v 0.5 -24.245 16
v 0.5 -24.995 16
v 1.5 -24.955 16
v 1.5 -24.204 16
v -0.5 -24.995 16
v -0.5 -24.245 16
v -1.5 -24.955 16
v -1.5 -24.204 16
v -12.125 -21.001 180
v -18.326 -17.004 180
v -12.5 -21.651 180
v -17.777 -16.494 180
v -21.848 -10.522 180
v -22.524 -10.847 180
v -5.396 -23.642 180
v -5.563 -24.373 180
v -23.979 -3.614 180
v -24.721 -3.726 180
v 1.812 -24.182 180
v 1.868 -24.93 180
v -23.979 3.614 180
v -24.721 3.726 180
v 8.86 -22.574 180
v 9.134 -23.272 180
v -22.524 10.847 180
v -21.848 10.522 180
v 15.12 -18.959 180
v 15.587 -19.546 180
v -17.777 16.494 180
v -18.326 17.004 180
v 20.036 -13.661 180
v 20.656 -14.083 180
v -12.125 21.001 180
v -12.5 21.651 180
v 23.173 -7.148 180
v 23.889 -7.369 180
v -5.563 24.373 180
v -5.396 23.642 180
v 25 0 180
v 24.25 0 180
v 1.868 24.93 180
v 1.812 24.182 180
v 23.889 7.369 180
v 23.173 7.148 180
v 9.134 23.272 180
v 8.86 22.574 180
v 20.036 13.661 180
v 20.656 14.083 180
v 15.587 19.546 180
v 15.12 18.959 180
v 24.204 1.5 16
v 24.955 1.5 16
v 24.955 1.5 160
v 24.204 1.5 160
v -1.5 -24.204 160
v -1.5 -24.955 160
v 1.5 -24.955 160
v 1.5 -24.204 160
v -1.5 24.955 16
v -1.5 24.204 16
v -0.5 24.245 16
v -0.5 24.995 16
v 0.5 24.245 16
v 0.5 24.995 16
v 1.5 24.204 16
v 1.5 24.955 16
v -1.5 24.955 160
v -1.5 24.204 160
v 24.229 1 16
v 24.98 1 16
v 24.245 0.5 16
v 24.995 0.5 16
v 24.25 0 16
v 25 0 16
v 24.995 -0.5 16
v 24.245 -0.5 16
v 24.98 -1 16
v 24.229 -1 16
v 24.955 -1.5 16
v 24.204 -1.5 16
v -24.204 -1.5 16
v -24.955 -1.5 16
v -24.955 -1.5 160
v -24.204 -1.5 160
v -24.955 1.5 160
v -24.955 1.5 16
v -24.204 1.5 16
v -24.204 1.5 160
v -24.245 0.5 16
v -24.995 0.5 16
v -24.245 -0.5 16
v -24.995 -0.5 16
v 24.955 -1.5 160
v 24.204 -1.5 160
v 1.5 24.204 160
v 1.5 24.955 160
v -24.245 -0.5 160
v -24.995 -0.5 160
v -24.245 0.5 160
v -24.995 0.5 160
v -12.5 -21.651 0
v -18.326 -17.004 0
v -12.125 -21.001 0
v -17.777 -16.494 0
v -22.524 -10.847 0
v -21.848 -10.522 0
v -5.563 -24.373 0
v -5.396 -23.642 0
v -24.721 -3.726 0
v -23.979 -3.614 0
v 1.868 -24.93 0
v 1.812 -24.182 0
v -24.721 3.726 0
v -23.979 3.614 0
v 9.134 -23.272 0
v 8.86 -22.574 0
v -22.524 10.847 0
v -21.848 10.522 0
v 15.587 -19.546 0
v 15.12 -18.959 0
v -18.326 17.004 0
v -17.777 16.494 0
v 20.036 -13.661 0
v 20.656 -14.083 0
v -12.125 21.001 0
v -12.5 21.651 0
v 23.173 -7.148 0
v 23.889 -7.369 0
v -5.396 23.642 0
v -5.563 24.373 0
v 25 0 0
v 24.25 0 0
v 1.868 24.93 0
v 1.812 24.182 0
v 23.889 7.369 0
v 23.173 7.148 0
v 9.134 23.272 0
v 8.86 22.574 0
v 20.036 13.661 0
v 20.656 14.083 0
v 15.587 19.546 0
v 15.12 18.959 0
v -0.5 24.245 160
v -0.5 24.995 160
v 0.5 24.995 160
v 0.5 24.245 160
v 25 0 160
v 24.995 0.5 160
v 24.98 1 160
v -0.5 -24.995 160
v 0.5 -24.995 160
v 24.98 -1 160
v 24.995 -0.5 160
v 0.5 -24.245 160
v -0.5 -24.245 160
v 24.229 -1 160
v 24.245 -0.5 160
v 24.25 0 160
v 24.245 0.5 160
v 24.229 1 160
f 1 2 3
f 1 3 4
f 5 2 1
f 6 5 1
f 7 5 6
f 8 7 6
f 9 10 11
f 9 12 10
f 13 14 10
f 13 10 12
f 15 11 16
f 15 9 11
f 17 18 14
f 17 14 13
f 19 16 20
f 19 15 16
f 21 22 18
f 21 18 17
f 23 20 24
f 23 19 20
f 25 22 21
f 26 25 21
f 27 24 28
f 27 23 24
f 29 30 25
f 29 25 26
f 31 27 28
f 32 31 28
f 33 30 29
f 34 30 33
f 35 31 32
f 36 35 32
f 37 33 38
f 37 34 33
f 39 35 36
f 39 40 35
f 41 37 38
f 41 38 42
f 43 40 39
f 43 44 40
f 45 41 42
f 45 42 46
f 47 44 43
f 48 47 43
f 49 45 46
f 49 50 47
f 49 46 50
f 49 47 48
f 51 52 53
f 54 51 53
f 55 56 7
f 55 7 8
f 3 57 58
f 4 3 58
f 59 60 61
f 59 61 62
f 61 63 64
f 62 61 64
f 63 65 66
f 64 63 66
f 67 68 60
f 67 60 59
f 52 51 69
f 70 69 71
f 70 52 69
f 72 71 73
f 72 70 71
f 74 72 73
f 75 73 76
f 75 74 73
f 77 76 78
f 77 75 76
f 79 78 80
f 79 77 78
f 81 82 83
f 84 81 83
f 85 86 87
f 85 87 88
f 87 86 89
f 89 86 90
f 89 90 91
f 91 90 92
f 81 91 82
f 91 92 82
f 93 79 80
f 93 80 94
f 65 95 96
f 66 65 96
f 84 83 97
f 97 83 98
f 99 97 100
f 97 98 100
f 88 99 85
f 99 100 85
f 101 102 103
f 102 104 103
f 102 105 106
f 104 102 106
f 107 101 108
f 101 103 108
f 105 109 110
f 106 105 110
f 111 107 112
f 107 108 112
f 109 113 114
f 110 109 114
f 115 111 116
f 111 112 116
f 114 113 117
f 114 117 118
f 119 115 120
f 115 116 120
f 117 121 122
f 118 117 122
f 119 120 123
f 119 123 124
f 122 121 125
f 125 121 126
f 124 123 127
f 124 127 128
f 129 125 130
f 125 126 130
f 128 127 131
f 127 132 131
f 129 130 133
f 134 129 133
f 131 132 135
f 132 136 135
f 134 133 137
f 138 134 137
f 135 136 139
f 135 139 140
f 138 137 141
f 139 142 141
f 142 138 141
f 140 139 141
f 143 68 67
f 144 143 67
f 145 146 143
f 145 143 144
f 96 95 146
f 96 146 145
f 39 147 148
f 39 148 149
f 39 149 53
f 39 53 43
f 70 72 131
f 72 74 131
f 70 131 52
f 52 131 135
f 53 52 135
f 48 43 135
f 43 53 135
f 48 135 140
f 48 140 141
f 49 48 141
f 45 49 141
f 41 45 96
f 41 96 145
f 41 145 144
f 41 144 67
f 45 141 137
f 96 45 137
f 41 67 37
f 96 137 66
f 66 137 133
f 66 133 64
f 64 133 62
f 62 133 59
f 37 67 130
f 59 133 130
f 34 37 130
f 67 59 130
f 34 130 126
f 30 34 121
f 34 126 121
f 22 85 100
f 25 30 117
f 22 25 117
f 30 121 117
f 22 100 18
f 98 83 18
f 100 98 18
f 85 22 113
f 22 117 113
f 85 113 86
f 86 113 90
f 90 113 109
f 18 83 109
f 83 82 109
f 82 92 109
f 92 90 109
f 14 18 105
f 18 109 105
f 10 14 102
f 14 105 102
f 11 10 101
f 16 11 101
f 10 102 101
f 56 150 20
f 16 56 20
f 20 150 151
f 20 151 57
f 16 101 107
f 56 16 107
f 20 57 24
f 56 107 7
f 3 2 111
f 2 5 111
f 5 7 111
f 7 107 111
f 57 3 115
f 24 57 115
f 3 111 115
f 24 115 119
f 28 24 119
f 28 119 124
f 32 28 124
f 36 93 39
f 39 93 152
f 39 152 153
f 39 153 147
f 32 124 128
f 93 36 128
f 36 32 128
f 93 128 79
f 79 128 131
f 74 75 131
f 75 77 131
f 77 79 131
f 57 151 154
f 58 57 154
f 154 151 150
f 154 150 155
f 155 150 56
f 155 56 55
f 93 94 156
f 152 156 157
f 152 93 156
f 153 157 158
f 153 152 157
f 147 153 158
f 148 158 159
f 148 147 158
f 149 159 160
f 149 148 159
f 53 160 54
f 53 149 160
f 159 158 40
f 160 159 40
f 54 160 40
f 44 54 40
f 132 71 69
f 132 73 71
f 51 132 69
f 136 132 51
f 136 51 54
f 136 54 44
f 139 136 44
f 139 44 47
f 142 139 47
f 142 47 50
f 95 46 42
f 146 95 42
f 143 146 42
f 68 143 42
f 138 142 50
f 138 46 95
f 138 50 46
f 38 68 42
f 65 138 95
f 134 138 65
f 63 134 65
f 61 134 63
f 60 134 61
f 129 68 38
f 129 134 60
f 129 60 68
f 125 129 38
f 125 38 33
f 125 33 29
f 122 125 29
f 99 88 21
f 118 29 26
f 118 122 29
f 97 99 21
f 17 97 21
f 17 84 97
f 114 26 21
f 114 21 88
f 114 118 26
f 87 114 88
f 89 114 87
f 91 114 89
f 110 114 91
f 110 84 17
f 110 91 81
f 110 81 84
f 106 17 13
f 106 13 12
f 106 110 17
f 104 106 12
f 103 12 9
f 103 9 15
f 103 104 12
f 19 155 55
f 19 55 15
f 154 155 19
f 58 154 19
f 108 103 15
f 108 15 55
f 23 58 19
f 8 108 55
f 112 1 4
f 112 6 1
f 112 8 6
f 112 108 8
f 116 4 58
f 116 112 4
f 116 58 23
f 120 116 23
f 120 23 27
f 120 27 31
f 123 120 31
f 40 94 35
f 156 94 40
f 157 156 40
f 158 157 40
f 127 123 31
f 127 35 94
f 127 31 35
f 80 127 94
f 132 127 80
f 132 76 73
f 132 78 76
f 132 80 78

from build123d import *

# Parameters (mm, degrees)
F0_R      = 25
F0_R_2    = 24.25
F1_DEPTH  = 180
F2_W      = 6.5743785797
F2_H      = 144
F2_W_2    = 7.4769609538
F3_DEPTH  = 1.5
F4_DEPTH  = 4
F5_DEPTH  = 4
F6_W      = 7.290615557
F6_H      = 144
F6_W_2    = 7.1577106116
F7_DEPTH  = 1.5
F8_DEPTH  = 4
F9_DEPTH  = 25
F10_DEPTH = 10


# Not quite as in the source:
# - a feature names something its author has since deleted; it is built from what else it names


with BuildPart() as f1:
    # F0 (on Top) → F1 (new body)
    with BuildSketch(Plane.XY):
        Circle(F0_R)
        Circle(F0_R_2, mode=Mode.SUBTRACT)
    extrude(amount=F1_DEPTH)

    # F2 (on Right) → F3 (cut, symmetric)
    with BuildSketch(Plane.YZ):
        with Locations((-28.224690467, 88)):
            Rectangle(F2_W, F2_H)
        with Locations((28.6692082882, 88)):
            Rectangle(F2_W_2, F2_H)
    extrude(amount=F3_DEPTH, both=True, mode=Mode.SUBTRACT)

    # F4 (cut): faces of the model
    f4_faces = [f1.faces().sort_by_distance(p)[0] for p in [
        (0, -24.9375011772, 88),
        (0, 24.9307278113, 88),
    ]]
    extrude(f4_faces, amount=-F4_DEPTH, dir=(0, -1, 0), mode=Mode.SUBTRACT)

    # F5 (cut): a face of the model
    f5_faces = [f1.faces().sort_by_distance(p)[0] for p in [
        (0, 24.9307278113, 88),
    ]]
    extrude(f5_faces, amount=-F5_DEPTH, mode=Mode.SUBTRACT)

    # F6 (on Front) → F7 (join, symmetric)
    with BuildSketch(Plane.XZ):
        with Locations((28.4072192601, 88)):
            Rectangle(F6_W, F6_H)
        with Locations((-28.2881861775, 88)):
            Rectangle(F6_W_2, F6_H)
    extrude(amount=F7_DEPTH, both=True)

    # F8 (cut): faces of the model
    f8_faces = [f1.faces().sort_by_distance(p)[0] for p in [
        (32.0525270386, 0, 88),
        (-31.8670414833, 0, 88),
    ]]
    extrude(f8_faces, amount=-F8_DEPTH, dir=(1, 0, 0), mode=Mode.SUBTRACT)

    # F9 (cut): a face of the model
    f9_faces = [f1.faces().sort_by_distance(p)[0] for p in [
        (28.0525270386, 0, 88),
    ]]
    extrude(f9_faces, amount=-F9_DEPTH, mode=Mode.SUBTRACT)

    # F10 (cut): a face of the model
    f10_faces = [f1.faces().sort_by_distance(p)[0] for p in [
        (-31.8670414833, 0, 88),
    ]]
    extrude(f10_faces, amount=-F10_DEPTH, mode=Mode.SUBTRACT)


solid = f1.part
